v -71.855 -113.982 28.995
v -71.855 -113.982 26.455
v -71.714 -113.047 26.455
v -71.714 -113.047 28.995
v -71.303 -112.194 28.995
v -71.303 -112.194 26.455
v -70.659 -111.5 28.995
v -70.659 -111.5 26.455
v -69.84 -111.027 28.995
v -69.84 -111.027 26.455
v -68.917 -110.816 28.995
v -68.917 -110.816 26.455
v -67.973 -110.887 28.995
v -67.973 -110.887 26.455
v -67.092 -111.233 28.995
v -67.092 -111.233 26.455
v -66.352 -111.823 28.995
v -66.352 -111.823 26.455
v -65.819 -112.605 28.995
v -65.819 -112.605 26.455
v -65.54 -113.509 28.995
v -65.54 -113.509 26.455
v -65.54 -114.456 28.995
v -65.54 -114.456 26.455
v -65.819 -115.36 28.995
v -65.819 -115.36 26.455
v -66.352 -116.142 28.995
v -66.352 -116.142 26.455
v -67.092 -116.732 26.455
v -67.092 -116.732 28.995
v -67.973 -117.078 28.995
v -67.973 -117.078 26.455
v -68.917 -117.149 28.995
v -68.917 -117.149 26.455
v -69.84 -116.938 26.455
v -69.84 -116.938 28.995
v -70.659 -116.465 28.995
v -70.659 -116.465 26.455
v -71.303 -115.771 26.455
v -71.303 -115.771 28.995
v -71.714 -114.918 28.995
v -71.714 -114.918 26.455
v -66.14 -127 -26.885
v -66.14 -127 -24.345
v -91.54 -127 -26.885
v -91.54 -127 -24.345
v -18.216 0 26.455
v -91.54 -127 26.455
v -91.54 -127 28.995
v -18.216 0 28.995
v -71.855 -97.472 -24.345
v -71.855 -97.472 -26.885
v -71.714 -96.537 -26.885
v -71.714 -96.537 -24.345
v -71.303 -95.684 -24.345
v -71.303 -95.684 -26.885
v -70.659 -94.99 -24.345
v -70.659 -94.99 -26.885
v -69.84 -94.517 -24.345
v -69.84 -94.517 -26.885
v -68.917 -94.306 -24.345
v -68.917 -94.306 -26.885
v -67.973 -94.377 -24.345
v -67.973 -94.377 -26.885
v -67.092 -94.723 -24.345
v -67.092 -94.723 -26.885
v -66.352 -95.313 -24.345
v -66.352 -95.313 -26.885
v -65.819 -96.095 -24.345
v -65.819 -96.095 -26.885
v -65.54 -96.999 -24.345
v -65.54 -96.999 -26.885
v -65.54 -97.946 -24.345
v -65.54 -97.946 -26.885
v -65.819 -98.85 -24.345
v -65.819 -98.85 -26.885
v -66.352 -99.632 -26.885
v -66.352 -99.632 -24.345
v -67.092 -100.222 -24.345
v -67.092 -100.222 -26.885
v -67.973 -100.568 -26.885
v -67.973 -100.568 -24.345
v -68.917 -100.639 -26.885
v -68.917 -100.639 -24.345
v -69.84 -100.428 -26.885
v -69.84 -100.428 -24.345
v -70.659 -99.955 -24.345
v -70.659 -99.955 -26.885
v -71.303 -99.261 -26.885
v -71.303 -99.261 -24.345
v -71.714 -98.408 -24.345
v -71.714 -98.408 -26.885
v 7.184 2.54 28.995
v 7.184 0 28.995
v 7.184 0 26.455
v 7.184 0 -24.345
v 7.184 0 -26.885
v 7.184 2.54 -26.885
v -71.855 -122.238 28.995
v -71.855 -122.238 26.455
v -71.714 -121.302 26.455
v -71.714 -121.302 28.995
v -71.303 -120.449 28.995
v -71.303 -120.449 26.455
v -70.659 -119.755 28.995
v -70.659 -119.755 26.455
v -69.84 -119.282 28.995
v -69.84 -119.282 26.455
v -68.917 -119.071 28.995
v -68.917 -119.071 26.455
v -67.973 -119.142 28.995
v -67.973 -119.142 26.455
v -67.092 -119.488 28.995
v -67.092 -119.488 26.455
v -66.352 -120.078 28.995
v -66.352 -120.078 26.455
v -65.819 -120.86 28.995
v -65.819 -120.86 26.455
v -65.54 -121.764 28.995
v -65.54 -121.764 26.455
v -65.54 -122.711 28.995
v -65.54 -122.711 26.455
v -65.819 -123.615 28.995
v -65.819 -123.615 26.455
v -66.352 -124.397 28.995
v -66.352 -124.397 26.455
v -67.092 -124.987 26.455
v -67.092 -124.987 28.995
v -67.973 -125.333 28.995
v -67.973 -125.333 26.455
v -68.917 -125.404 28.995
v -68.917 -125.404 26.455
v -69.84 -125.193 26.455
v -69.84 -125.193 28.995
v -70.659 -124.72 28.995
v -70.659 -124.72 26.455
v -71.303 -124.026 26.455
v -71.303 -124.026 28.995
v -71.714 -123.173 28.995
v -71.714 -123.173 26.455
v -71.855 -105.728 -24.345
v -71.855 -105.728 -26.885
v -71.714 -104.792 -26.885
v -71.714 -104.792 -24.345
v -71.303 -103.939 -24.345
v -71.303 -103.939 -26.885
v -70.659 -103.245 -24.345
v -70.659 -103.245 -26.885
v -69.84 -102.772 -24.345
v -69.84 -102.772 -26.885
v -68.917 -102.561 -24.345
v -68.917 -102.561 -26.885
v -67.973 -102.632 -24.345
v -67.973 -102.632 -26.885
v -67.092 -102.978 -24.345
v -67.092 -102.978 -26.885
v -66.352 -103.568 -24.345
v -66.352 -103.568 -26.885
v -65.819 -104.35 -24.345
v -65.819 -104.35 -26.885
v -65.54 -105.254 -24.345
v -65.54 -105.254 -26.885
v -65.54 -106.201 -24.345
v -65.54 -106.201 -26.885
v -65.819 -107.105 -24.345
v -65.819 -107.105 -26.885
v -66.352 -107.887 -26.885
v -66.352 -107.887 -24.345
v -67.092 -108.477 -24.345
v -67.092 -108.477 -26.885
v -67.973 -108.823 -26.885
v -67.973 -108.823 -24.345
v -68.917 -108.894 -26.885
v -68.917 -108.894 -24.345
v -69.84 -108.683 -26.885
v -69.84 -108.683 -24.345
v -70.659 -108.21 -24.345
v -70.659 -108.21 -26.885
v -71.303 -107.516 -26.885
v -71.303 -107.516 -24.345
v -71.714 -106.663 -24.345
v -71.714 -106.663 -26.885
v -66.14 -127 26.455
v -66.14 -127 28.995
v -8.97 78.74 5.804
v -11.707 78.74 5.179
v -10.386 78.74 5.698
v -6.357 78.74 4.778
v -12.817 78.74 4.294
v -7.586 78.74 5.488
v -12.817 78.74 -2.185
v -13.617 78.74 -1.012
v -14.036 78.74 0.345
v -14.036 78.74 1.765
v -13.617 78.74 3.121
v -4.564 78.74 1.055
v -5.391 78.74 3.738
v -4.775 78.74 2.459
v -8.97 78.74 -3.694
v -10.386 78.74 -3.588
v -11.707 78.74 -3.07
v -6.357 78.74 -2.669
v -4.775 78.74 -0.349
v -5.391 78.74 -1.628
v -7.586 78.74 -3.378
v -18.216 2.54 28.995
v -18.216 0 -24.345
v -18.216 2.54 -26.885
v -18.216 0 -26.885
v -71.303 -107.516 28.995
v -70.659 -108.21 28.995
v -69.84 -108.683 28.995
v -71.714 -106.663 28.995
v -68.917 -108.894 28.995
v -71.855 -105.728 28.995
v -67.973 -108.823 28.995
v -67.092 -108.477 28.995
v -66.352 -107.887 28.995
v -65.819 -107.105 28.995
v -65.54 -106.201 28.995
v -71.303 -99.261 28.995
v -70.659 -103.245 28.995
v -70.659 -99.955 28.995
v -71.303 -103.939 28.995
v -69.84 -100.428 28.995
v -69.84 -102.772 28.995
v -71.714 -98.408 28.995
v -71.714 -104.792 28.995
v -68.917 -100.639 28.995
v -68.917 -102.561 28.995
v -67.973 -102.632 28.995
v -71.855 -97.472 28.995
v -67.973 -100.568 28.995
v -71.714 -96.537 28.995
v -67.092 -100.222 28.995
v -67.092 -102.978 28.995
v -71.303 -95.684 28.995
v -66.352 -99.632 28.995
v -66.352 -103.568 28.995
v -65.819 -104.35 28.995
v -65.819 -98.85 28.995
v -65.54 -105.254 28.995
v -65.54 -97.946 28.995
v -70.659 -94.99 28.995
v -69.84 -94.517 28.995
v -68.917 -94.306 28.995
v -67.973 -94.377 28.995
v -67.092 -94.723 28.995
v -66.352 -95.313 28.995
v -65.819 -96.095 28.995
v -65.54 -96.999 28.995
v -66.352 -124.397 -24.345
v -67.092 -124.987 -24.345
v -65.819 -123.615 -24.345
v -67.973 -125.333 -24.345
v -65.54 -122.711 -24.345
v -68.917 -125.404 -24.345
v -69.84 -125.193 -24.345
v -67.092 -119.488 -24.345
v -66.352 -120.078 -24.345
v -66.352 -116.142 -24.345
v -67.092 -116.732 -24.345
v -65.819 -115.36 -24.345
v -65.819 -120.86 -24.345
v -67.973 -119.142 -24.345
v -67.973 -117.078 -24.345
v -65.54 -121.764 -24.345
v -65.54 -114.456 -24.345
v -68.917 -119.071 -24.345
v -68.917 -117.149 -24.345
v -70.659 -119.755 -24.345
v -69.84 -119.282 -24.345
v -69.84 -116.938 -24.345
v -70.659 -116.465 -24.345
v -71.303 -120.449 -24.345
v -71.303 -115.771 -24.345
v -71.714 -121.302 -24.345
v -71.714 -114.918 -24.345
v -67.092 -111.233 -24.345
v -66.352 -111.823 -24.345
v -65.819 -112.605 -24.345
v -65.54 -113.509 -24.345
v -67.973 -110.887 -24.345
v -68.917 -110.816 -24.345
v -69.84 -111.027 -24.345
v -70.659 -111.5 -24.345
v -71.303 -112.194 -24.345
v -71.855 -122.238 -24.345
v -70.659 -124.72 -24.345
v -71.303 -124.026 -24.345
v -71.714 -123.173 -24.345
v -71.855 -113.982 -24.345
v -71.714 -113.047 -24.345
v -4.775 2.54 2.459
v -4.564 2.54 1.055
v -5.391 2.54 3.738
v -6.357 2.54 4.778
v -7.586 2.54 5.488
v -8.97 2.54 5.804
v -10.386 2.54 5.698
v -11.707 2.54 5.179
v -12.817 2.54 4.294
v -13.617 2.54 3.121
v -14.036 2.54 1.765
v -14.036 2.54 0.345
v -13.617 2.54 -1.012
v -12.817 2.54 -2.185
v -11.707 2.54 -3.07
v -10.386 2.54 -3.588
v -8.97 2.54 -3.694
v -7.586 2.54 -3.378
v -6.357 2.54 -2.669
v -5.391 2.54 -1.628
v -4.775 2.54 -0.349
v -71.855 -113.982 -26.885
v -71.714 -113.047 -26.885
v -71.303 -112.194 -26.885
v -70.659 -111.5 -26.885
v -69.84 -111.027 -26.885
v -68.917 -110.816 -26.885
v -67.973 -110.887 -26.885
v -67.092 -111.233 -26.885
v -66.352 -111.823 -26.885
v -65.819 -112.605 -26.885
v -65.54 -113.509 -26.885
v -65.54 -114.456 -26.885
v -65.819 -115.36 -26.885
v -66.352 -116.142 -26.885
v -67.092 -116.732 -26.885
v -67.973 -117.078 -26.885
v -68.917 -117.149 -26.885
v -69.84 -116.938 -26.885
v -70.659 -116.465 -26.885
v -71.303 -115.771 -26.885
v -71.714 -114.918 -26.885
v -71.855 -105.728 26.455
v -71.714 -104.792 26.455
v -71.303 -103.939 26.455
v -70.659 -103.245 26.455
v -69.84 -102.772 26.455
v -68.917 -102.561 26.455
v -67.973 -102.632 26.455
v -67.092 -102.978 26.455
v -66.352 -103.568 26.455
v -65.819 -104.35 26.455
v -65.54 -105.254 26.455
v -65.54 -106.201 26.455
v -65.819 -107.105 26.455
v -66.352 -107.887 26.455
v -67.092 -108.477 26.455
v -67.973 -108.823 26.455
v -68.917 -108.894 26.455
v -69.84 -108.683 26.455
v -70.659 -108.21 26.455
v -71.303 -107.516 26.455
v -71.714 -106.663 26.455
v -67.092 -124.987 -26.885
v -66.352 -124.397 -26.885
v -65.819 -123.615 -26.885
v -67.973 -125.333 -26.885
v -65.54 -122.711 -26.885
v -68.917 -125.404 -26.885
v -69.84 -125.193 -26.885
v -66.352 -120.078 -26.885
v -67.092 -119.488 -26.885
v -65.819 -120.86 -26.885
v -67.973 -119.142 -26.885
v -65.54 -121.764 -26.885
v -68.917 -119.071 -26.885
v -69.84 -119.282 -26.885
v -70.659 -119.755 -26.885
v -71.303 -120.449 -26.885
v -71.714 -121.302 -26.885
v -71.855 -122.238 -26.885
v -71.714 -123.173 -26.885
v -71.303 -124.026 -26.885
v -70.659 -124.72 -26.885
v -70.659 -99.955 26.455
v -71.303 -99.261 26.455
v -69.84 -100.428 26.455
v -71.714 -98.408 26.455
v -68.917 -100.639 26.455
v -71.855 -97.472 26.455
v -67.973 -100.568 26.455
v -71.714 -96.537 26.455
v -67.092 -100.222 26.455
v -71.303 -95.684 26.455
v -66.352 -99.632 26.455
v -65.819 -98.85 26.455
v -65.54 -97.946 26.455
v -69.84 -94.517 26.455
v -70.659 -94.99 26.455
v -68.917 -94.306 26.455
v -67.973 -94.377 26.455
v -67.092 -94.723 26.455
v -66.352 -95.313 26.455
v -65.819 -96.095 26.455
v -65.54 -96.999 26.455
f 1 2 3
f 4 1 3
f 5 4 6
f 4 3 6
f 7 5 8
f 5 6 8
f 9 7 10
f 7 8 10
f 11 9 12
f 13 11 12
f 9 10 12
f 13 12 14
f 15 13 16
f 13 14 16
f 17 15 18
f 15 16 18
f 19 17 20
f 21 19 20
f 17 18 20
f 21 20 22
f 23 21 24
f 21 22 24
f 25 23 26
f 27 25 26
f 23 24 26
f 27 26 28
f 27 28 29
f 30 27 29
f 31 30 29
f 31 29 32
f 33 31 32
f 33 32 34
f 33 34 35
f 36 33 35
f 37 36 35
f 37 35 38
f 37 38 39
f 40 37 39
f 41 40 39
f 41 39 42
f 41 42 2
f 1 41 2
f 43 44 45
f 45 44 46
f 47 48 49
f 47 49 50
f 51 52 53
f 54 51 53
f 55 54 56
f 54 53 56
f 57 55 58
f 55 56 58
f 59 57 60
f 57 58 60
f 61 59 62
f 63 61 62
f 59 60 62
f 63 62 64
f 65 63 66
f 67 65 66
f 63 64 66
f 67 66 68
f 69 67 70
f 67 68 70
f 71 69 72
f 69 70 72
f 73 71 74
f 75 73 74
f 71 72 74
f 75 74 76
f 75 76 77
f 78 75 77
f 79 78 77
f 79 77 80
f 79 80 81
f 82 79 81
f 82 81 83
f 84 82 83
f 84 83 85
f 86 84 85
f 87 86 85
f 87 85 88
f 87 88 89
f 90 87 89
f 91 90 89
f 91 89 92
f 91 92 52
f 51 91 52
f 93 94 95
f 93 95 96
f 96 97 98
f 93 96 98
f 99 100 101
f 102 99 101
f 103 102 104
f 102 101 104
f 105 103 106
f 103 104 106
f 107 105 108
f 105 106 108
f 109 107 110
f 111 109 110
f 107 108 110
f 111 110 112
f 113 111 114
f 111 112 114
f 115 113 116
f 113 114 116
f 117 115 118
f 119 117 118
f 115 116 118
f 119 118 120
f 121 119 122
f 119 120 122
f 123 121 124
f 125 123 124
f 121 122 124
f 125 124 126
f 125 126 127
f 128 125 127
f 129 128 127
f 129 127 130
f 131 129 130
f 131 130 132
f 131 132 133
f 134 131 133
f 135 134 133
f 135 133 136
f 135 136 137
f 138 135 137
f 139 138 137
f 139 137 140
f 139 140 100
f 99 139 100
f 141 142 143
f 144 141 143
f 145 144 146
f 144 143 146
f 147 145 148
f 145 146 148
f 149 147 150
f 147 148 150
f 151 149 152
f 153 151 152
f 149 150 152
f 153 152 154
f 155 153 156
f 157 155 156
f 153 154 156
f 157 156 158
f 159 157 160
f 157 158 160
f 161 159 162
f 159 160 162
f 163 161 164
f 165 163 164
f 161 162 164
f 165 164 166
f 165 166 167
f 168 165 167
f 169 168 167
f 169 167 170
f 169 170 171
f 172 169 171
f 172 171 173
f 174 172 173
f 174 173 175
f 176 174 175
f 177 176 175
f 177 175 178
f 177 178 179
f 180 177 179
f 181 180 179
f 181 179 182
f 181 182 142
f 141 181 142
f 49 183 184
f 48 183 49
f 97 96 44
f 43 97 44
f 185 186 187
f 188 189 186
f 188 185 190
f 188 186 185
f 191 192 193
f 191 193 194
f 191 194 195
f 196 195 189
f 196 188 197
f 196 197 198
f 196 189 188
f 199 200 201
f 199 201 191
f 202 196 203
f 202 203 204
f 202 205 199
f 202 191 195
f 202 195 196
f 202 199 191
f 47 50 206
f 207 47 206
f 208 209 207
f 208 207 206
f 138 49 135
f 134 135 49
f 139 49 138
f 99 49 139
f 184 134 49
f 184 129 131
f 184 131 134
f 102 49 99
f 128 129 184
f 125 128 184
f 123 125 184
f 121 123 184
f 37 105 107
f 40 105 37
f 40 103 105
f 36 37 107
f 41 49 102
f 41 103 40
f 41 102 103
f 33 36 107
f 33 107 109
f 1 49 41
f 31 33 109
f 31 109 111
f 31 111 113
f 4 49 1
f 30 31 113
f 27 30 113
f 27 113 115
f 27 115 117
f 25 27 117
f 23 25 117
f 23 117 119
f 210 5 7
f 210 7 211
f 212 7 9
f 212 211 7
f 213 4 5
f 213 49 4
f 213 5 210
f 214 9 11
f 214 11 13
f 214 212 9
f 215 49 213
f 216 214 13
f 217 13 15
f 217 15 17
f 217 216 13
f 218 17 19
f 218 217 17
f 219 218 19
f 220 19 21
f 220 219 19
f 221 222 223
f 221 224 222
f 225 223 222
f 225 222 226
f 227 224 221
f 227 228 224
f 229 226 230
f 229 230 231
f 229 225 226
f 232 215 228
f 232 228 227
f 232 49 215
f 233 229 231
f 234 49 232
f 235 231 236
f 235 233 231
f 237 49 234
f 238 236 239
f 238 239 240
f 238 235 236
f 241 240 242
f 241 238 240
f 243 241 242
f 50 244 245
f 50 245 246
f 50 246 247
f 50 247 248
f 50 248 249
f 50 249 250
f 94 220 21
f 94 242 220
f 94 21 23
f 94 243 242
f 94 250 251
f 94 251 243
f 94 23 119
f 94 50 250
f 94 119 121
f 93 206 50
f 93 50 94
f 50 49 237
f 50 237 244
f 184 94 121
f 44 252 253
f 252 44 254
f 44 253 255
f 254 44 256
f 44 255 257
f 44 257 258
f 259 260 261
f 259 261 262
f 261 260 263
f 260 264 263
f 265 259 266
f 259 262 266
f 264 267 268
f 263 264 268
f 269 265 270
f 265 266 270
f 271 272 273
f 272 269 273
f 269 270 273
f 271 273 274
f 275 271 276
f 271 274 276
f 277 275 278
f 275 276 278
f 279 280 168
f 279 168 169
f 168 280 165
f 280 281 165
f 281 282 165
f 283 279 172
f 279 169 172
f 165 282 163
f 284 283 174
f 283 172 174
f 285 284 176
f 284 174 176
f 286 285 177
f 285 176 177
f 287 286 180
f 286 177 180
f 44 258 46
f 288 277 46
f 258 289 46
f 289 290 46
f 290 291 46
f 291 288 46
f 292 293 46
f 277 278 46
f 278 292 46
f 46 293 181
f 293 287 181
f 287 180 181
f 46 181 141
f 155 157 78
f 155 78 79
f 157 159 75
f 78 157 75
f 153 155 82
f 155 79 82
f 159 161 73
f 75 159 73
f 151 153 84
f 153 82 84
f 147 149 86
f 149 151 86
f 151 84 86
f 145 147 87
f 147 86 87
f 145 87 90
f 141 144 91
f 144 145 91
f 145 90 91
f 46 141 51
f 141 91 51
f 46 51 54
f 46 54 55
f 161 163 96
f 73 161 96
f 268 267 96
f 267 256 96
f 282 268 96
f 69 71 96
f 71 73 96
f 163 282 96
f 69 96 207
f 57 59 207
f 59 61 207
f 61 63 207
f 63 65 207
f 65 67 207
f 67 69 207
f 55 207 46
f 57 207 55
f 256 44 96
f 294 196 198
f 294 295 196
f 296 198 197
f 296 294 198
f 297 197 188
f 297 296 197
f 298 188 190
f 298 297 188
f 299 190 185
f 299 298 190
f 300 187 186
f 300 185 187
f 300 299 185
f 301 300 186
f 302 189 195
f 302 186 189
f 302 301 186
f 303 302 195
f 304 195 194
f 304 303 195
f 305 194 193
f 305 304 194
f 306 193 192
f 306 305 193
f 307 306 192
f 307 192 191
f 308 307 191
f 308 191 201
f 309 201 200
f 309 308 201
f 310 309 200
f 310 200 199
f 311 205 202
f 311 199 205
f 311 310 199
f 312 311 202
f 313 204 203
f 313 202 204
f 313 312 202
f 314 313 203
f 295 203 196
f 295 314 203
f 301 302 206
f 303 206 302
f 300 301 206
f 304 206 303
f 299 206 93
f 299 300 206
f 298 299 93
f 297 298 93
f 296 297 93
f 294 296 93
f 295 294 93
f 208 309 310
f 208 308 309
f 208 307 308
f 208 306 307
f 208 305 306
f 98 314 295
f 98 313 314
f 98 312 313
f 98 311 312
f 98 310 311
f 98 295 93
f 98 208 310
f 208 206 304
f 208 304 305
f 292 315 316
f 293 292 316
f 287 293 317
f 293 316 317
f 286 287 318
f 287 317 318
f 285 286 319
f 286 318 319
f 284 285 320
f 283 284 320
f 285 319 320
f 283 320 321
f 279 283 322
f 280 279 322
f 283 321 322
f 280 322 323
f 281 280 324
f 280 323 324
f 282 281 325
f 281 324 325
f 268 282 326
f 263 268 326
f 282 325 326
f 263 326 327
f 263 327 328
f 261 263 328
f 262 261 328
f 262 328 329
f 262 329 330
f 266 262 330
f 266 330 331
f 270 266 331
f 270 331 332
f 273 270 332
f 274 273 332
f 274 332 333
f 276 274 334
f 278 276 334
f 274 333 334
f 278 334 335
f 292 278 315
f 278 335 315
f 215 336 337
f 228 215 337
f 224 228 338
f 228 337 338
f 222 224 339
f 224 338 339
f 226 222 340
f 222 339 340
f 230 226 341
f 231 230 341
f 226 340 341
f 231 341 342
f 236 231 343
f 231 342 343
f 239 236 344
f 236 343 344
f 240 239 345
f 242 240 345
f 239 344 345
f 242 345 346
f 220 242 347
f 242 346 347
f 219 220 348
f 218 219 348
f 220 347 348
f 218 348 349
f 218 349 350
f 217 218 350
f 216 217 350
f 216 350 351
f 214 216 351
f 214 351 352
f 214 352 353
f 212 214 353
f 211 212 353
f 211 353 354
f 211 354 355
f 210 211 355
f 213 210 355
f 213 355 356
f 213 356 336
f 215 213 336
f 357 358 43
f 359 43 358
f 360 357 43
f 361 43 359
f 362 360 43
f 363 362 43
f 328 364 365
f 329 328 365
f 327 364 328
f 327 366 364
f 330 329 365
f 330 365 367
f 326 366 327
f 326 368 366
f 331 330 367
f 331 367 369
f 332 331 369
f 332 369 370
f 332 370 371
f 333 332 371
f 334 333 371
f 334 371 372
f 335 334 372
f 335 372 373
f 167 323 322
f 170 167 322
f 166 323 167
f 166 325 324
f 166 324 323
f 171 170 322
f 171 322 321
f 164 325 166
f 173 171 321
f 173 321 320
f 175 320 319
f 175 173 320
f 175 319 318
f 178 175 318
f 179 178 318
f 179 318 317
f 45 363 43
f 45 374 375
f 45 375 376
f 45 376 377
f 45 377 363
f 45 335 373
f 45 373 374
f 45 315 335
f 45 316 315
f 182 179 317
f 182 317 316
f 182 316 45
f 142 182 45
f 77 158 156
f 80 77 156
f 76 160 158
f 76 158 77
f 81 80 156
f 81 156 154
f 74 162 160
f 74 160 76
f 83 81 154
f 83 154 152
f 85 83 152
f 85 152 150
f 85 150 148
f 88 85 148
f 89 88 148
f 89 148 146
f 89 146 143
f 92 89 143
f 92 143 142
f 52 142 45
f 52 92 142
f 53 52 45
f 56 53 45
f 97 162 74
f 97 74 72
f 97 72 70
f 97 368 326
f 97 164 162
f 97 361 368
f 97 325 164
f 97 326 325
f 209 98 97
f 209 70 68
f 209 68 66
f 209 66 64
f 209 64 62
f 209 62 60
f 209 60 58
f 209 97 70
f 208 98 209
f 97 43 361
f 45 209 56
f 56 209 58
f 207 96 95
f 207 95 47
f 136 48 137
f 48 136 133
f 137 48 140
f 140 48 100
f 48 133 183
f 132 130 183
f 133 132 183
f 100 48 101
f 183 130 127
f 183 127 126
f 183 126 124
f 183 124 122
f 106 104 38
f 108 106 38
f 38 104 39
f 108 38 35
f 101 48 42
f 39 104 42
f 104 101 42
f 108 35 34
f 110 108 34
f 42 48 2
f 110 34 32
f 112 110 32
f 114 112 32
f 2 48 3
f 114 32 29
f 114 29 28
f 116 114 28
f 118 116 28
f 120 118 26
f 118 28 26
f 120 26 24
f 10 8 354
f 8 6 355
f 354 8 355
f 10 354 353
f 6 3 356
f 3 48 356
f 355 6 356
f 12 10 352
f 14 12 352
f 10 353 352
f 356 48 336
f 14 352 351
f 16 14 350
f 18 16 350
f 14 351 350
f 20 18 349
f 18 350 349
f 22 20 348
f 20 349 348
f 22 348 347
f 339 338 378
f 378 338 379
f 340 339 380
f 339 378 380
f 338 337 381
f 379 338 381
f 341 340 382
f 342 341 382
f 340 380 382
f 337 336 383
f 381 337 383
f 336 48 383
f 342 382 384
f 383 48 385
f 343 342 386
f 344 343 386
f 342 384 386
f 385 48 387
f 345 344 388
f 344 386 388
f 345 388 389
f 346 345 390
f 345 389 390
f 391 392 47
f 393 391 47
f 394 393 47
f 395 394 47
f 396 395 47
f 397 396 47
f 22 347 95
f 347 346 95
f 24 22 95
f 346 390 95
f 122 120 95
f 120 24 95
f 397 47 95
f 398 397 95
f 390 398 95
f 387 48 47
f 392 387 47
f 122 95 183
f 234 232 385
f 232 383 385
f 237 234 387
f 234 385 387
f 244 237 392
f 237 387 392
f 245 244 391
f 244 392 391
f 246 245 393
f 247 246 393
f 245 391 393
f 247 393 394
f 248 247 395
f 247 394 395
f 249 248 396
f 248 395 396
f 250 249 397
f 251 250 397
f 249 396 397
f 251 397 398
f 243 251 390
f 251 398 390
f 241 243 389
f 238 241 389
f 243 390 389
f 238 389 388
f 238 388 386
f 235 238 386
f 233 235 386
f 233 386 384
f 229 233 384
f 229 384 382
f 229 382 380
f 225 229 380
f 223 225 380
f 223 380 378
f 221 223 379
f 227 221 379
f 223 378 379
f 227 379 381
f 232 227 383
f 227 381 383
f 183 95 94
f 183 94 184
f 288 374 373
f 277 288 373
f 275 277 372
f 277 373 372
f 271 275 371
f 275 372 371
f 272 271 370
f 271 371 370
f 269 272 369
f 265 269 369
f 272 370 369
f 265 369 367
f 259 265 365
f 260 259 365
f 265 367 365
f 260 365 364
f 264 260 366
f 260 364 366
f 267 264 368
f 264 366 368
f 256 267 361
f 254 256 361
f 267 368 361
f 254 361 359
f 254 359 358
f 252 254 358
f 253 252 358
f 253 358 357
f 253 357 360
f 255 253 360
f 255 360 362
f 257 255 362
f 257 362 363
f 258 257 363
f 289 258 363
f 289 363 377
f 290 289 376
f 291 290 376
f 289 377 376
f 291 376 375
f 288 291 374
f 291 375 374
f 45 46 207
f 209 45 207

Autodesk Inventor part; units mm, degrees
ref_plane "YZ Plane" through (0, 0, 0) normal (1, 0, 0) x (0, 1, 0)
ref_plane "XZ Plane" through (0, 0, 0) normal (0, 1, 0) x (-1, 0, 0)
ref_plane "XY Plane" through (0, 0, 0) normal (0, 0, 1) x (1, 0, 0)
sketch "Sketch1" plane through (0, 0, 0) normal (0, 1, 0) x (-1, 0, 0)
  line L0 (18.2162, 26.4548) -> (-7.1838, 26.4548)
  line L1 (-7.1838, 26.4548) -> (-7.1838, -24.3452)
  line L2 (-7.1838, -24.3452) -> (18.2162, -24.3452)
  line L3 (18.2162, -24.3452) -> (18.2162, 26.4548)
  point P0 (0, 0)
  dimension "d0" = 50.8
  dimension "d1" = 25.4
extrude "Extrusion1" add sketch "Sketch1" along normal blind 2.54
sketch "Sketch2" plane through (7.1838, 0, -24.3452) normal (0, 0, -1) x (-1, 0, 0)
  line L0 (0, 0) -> (73.3235, -127)
  line L1 (73.3235, -127) -> (98.7235, -127)
  line L2 (0, 0) -> (25.4, 0) projected
  line L3 (98.7235, -127) -> (25.4, 0)
  line L4 (0, 2.54) -> (25.4, 2.54) projected
  line L5 (0, 0) -> (0, 2.54)
  line L6 (0, 2.54) -> (25.4, 2.54)
  line L7 (25.4, 2.54) -> (25.4, 0)
  point P0 (7.1838, 0)
  dimension "d4" = 60
  dimension "d5" = 127
extrude "Extrusion2" add sketch "Sketch2" along normal blind 2.54
sketch "Sketch3" plane through (-18.2162, 0, 26.4548) normal (0, 0, 1) x (1, 0, 0)
  line L0 (0, 0) -> (0, 2.54) projected
  line L1 (0, 0) -> (0, 2.54)
  line L2 (25.4, 0) -> (25.4, 2.54) projected
  line L3 (0, 2.54) -> (25.4, 2.54)
  line L4 (25.4, 2.54) -> (25.4, 0)
  line L5 (25.4, 0) -> (-47.9235, -127) projected
  line L6 (25.4, 0) -> (-47.9235, -127)
  line L7 (-47.9235, -127) -> (-73.3235, -127) projected
  line L8 (-47.9235, -127) -> (-73.3235, -127)
  line L9 (-73.3235, -127) -> (0, 0)
  point P0 (18.2162, 0)
extrude "Extrusion3" add sketch "Sketch3" along normal blind 2.54
sketch "Sketch4" plane through (0, 2.54, 0) normal (0, 1, 0) x (1, 0, 0)
  line L0 (7.1838, -26.4548) -> (7.1838, 24.3452) construction
  line L1 (-66.1396, -28.9948) -> (7.1838, -28.9948) construction
  line L2 (7.1838, -1.0548) -> (-9.3262, -1.0548) construction
  line L3 (-9.3262, -1.0548) -> (-9.3262, -28.9948) construction
  line L4 (-9.3262, -28.9948) -> (7.1838, -28.9948) construction
  line L5 (7.1838, -28.9948) -> (7.1838, -1.0548) construction
  circle A0 centre (-9.3262, -1.0548) radius 4.7625
  dimension "d11" = 16.51
  dimension "d12" = 9.525
extrude "Extrusion4" add sketch "Sketch4" along normal blind 76.2
sketch "Sketch5" plane through (7.1838, 0, -26.8852) normal (0, 0, -1) x (-1, 0, 0)
  line L0 (98.7235, -127) -> (25.4, 0) projected
  line L1 (98.7235, -127) -> (75.8635, -127)
  line L2 (75.8635, -127) -> (75.8635, -87.4053)
  line L3 (75.8635, -87.4053) -> (98.7235, -87.4053)
  line L4 (98.7235, -87.4053) -> (98.7235, -127)
  circle A0 centre (75.8635, -122.2375) radius 3.175
  circle A1 centre (75.8635, -113.9825) radius 3.175
  circle A2 centre (75.8635, -105.7275) radius 3.175
  circle A3 centre (75.8635, -97.4725) radius 3.175
  point P0 (7.1838, 0)
  dimension "d15" = 6.35
  dimension "d16" = 4.7625
  dimension "d17" = 22.86
  dimension "d20" = 8.255
extrude "Extrusion5" cut sketch "Sketch5" against normal through all contours A3 L2 | L2 A3 | A0 L2 | L2 A0 | A2 L2 | L2 A2 | A1 L2 | L2 A1
sketch "Sketch6" plane through (-18.2162, 0, 28.9948) normal (0, 0, 1) x (1, 0, 0)
  circle A0 centre (-50.4635, -105.7275) radius 3.175 projected
  circle A1 centre (-50.4635, -105.7275) radius 101.6 construction
  line L0 (25.4, 2.54) -> (0, 2.54) projected
  point P0 (18.2162, 0)
  point P1 (-50.4635, -4.1275)
  dimension "d27" = 203.2
  dimension "d28" = 6.6675
properties part number "Wheel-Housing"
